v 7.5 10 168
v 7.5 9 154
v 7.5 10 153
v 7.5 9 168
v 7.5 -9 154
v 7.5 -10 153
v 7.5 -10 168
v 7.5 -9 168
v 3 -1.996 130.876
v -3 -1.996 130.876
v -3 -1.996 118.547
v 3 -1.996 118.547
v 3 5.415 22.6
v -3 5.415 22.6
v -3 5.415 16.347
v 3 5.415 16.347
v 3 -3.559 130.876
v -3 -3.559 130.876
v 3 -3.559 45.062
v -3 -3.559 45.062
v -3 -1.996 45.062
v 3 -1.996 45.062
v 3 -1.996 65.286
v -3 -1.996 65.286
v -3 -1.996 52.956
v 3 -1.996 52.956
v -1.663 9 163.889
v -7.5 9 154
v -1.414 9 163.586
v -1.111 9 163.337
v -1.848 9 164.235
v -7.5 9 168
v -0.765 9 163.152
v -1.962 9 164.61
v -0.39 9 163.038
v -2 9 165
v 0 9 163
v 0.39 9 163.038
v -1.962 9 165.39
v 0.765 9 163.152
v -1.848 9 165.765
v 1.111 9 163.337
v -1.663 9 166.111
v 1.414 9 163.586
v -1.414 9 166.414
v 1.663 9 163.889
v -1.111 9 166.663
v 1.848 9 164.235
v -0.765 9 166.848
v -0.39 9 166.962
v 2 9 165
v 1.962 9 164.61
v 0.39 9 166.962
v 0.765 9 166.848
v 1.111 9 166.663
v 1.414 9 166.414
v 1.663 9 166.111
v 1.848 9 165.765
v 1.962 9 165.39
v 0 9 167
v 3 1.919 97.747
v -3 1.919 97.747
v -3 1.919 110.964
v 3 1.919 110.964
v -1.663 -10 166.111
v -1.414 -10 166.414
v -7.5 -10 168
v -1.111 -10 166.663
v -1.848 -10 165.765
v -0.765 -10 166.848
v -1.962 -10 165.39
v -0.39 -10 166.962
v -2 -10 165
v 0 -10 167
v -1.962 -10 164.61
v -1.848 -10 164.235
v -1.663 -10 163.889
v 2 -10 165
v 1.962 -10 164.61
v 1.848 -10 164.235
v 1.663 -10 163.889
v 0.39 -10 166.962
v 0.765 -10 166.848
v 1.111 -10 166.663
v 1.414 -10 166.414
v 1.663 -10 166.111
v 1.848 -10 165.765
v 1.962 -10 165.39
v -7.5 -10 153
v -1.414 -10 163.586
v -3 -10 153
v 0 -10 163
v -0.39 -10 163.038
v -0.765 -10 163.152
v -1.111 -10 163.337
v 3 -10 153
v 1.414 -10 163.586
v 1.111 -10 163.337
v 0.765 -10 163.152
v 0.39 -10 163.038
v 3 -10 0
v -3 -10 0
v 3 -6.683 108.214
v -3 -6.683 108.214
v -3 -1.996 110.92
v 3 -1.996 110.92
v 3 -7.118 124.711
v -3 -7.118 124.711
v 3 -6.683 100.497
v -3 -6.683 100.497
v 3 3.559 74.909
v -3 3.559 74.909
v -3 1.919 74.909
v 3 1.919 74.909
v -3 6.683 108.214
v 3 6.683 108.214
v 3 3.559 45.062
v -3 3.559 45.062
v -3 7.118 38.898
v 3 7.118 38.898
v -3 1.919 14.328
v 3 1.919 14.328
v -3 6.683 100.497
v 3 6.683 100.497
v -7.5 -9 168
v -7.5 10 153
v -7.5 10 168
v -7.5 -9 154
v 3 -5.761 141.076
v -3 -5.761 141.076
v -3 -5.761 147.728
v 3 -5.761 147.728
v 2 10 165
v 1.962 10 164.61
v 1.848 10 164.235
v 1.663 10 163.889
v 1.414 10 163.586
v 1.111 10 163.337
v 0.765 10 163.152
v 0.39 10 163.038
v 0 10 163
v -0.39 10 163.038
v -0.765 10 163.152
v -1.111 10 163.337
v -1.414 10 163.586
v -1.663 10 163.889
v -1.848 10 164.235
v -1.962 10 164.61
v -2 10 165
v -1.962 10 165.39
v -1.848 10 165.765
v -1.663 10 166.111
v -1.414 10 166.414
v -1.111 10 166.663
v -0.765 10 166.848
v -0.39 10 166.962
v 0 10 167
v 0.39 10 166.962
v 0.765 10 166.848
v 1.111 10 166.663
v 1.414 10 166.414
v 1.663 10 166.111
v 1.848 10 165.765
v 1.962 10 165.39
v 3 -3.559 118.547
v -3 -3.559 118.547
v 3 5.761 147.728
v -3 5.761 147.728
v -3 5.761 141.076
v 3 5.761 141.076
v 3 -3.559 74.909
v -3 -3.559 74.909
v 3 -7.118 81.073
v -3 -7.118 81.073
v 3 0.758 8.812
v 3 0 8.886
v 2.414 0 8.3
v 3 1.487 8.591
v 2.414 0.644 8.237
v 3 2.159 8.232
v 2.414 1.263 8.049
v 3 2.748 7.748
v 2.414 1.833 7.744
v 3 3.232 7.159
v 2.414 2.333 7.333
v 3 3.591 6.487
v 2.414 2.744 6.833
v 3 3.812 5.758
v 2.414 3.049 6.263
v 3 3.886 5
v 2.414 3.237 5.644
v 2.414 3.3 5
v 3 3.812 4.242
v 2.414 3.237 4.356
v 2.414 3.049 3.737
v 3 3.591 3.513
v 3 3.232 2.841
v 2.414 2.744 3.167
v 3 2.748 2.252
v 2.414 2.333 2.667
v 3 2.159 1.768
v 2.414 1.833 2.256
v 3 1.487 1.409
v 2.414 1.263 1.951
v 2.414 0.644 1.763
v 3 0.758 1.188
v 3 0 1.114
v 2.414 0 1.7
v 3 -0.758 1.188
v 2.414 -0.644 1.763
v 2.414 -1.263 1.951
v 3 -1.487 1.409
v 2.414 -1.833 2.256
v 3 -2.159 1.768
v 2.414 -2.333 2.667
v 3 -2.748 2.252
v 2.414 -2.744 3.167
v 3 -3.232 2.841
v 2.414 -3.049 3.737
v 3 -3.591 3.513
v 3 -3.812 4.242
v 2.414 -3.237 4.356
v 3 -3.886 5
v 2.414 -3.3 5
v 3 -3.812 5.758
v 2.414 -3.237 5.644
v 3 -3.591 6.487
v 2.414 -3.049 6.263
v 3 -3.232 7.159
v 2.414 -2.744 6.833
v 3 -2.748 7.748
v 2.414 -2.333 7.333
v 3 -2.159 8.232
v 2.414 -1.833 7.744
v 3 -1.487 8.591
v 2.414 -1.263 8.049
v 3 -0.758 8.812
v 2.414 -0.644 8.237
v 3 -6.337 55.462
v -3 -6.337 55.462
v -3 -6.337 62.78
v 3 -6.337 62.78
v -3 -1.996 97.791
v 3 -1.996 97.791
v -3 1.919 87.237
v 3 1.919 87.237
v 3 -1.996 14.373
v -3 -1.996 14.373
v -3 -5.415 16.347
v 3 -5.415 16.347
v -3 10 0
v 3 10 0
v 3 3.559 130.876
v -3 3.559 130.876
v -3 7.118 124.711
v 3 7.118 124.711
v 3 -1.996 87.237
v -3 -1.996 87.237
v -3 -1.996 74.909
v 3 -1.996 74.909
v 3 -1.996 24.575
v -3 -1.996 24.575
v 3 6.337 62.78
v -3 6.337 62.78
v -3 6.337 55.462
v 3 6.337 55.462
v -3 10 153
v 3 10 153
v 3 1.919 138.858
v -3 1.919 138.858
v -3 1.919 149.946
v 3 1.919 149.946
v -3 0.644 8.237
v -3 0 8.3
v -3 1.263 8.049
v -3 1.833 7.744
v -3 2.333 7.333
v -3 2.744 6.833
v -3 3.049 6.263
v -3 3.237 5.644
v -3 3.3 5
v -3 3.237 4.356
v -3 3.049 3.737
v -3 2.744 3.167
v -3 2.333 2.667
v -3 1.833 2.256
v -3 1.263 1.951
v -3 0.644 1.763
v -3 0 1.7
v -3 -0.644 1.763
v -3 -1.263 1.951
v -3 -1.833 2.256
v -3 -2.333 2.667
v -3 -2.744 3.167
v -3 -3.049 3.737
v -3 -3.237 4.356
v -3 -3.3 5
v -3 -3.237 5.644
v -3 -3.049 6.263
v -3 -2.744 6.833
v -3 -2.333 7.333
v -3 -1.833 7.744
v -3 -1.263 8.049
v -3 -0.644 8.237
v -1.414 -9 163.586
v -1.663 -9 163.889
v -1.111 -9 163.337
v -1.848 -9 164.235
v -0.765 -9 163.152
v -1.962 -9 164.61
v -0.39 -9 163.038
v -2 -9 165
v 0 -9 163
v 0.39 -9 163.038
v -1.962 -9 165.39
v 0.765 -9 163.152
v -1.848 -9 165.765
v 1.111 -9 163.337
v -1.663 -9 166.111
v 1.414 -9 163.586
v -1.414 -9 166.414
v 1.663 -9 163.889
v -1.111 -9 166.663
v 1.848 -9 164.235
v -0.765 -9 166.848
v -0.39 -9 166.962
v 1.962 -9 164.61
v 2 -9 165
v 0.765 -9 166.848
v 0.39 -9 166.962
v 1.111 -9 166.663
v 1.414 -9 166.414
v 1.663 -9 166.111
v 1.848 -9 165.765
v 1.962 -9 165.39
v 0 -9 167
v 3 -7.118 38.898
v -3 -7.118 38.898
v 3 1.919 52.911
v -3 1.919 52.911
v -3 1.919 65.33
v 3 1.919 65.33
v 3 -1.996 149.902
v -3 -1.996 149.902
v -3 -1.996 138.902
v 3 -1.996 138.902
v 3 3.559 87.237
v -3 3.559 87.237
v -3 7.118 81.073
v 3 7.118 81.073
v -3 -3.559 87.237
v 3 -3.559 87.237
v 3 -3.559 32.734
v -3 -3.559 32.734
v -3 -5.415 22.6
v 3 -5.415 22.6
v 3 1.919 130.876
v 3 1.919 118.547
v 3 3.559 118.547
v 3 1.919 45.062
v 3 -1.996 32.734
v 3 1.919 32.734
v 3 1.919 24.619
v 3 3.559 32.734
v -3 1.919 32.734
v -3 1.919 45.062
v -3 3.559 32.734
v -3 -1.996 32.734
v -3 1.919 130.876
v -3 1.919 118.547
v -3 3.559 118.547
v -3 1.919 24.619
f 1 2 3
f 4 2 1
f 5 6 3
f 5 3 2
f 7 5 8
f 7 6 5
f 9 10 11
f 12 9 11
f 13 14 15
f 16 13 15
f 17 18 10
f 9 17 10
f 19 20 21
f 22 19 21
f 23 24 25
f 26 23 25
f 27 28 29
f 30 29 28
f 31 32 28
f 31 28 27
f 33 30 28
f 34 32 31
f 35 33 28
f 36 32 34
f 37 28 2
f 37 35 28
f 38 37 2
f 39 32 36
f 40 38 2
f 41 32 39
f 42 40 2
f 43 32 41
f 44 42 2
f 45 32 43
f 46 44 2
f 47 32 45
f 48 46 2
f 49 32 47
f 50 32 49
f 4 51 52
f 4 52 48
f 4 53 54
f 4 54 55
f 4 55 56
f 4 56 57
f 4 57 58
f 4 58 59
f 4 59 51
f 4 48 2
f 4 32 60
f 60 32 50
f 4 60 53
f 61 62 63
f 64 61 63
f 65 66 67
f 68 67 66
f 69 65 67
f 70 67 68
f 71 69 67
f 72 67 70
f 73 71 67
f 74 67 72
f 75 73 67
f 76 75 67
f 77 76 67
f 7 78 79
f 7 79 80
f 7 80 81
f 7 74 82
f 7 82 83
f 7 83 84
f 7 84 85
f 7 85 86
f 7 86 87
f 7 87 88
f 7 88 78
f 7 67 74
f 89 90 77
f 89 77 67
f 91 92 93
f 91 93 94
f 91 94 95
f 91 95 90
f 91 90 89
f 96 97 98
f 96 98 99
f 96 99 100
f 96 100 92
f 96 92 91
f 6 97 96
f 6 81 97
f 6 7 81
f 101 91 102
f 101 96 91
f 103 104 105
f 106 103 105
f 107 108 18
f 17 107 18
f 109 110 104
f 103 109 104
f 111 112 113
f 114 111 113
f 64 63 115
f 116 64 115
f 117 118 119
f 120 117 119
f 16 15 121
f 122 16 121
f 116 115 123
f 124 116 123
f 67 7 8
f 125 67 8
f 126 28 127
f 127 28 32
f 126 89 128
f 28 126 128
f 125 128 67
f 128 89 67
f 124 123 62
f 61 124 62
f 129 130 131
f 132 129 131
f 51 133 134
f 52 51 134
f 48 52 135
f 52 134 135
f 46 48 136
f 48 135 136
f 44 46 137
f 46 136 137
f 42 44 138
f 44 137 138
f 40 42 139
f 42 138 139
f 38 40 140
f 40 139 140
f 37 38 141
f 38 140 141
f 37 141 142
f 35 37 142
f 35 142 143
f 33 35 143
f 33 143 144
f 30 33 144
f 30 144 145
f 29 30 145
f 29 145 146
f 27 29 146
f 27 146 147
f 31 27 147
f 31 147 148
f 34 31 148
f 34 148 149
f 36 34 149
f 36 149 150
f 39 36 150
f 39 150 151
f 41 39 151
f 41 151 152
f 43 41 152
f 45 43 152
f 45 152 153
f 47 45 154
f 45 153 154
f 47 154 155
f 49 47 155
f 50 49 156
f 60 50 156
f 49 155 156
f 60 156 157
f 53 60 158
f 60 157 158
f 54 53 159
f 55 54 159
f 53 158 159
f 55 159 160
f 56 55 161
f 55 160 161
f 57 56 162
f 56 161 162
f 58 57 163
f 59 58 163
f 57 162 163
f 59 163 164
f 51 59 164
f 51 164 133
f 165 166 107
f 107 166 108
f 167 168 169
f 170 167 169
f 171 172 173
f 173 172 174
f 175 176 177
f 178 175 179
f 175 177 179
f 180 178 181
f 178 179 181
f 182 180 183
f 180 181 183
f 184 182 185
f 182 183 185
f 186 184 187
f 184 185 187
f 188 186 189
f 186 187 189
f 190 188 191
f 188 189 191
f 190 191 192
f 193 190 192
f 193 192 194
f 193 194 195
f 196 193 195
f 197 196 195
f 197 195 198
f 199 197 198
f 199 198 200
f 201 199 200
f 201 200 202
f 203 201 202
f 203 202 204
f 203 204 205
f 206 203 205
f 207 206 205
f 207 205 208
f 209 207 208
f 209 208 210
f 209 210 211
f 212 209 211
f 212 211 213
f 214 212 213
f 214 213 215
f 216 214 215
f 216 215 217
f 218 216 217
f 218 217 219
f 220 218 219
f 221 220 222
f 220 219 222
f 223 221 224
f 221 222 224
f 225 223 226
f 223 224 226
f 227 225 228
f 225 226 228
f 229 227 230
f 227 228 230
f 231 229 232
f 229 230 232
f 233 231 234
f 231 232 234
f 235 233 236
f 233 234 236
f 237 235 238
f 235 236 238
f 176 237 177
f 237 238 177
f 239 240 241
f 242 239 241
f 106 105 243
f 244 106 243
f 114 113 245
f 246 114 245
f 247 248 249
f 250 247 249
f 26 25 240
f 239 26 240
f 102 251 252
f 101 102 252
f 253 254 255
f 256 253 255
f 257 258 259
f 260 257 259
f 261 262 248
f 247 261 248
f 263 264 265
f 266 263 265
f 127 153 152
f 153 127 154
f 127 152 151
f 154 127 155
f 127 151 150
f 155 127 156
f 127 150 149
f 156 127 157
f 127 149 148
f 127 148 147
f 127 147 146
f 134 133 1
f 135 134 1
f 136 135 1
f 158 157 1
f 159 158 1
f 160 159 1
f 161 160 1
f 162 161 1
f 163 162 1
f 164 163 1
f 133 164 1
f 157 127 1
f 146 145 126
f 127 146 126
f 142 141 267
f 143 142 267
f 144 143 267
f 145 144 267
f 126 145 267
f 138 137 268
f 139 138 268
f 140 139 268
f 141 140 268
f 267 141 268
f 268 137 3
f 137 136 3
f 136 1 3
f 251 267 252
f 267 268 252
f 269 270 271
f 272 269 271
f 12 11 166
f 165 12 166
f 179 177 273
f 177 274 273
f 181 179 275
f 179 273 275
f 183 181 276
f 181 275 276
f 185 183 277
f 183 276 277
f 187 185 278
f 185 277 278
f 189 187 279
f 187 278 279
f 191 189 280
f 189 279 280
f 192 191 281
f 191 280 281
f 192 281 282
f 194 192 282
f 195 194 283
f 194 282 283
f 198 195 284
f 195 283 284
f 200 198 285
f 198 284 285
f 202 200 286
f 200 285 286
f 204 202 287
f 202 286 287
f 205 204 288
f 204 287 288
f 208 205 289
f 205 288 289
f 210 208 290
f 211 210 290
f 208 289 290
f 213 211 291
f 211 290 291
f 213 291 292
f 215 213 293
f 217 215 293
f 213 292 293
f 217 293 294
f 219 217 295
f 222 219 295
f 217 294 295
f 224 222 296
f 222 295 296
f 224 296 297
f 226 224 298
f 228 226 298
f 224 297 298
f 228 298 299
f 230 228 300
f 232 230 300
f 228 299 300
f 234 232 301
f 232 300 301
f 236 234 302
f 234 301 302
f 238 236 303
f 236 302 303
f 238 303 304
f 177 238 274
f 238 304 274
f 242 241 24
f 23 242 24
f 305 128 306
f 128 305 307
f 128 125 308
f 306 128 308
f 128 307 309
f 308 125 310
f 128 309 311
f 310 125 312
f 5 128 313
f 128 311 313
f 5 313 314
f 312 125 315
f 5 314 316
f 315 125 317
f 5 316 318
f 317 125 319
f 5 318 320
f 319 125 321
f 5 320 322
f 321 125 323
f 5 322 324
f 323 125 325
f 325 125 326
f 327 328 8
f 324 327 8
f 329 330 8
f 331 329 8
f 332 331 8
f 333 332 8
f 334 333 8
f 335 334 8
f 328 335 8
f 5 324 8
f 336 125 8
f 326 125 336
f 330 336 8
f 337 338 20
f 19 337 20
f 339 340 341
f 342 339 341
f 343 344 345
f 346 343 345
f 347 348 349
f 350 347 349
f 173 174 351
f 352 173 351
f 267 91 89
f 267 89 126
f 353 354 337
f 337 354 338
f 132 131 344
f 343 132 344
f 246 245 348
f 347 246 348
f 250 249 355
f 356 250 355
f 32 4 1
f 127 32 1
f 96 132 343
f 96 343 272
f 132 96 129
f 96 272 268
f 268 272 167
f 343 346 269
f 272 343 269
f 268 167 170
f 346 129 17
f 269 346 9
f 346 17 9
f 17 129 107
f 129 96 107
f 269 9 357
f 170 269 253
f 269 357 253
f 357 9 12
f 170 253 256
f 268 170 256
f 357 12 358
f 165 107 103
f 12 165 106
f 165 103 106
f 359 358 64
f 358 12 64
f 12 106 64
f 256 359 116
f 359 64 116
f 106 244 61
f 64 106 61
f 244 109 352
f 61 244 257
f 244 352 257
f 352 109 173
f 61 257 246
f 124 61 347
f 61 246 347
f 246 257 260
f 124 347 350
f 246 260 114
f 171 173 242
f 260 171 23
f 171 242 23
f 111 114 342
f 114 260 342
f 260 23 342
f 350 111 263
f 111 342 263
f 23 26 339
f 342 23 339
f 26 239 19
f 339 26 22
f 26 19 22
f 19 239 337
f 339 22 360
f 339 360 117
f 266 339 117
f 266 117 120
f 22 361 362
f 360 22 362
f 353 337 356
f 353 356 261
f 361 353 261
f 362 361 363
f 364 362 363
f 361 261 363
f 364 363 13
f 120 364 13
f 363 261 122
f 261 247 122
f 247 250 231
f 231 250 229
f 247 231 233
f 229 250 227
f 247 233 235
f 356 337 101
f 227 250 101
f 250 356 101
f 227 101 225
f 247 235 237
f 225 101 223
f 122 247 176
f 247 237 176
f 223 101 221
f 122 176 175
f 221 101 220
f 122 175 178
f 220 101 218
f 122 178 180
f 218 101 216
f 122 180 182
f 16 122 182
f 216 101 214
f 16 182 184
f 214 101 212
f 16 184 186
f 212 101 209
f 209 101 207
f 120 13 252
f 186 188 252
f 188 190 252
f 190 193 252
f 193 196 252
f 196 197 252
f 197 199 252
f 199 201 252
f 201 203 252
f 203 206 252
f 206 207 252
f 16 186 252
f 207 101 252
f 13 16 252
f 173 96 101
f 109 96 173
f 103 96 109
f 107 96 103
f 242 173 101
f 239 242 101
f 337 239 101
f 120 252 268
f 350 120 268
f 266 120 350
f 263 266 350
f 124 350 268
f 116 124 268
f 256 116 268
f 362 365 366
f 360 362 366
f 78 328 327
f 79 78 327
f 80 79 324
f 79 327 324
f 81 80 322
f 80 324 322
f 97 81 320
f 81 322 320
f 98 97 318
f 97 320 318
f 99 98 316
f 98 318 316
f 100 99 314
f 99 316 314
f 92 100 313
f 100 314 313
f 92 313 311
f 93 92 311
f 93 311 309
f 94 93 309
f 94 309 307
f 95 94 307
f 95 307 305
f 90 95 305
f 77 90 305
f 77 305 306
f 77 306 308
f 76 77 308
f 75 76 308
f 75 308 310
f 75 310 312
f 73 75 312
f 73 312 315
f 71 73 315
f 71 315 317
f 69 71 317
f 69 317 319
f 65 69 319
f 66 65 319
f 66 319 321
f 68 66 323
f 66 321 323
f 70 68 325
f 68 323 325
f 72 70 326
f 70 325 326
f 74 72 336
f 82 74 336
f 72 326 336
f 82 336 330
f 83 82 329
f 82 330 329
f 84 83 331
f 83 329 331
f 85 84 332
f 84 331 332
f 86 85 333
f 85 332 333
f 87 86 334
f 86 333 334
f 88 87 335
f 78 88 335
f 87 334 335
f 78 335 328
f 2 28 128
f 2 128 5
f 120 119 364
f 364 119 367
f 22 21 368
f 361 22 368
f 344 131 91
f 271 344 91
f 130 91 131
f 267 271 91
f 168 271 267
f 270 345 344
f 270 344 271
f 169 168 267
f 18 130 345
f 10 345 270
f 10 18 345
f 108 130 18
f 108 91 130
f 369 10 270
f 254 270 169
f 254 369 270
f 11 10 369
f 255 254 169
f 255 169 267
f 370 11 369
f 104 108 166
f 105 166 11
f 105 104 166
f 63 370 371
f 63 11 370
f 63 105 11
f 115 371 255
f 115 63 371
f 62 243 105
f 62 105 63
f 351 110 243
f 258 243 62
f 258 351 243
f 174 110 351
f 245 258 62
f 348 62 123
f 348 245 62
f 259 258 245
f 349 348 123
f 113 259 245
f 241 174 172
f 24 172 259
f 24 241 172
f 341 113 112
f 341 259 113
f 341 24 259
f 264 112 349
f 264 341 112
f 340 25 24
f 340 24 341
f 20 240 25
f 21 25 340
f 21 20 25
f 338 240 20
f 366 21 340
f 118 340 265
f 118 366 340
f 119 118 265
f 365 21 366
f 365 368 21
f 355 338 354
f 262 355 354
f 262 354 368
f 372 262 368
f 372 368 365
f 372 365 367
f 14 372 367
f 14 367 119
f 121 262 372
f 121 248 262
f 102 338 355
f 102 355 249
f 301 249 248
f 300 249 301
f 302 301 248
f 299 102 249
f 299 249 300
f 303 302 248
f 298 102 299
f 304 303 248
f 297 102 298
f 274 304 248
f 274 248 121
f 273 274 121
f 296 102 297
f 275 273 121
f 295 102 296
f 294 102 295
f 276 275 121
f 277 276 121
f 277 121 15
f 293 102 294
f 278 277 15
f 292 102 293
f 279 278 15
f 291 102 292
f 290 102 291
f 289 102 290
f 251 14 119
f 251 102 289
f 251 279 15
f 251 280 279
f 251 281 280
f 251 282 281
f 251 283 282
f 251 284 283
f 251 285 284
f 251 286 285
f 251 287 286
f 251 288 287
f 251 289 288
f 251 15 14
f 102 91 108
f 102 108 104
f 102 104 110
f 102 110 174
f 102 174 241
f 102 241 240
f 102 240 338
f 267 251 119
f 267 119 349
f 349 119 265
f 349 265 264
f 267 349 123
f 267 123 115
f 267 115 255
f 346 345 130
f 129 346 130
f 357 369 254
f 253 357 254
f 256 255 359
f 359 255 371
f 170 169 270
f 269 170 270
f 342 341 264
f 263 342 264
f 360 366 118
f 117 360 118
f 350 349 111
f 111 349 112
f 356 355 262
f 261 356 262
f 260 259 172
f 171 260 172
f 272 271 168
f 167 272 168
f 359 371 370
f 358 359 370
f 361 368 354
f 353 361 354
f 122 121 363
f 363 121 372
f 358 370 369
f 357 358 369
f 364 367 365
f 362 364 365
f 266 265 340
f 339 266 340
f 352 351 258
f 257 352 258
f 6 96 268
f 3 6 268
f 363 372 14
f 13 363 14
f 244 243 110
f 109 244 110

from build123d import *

# Parameters (mm, degrees)
SKETCH_1_W                      = 6
SKETCH_1_H                      = 20
EXTRUDE_1_DEPTH                 = 165
HOLE_WIZARD_G1_16_1_D           = 6.6
HOLE_WIZARD_G1_16_1_DEPTH       = 50
HOLE_WIZARD_G1_16_1_CSINK_D     = 7.773
HOLE_WIZARD_G1_16_1_CSINK_ANGLE = 90
HOLE_WIZARD_G1_16_1_TIP         = 1.982840043
SKETCH_5_W                      = 15
SKETCH_5_H                      = 20
EXTRUDE_2_DEPTH                 = 10
EXTRUDE_2_DEPTH_BACK            = 15
SKETCH_6_W                      = 5.5
SKETCH_6_H                      = 15
SKETCH_6_W_2                    = 4.5
CUT_EXTRUDE_1_DEPTH             = 32
SKETCH_7_W                      = 15
SKETCH_7_H                      = 18
CUT_EXTRUDE_2_DEPTH             = 14
SKETCH_8_R                      = 2
CUT_EXTRUDE_3_DEPTH             = 39
CUT_EXTRUDE_4_DEPTH             = 70


with BuildPart() as part:
    # 草图1 → 凸台-拉伸1 (new body)
    with BuildSketch(Plane.XY):
        Rectangle(SKETCH_1_W, SKETCH_1_H)
    extrude(amount=EXTRUDE_1_DEPTH)

    # G1/16 螺纹孔1
    with Locations(Plane(origin=(3, 0, 0), x_dir=(0, 0, -1), z_dir=(1, 0, 0))):
        with Locations((-5, 0)):
            CounterSinkHole(HOLE_WIZARD_G1_16_1_D / 2, HOLE_WIZARD_G1_16_1_CSINK_D / 2, depth=HOLE_WIZARD_G1_16_1_DEPTH, counter_sink_angle=HOLE_WIZARD_G1_16_1_CSINK_ANGLE)
            with Locations((0, 0, -(HOLE_WIZARD_G1_16_1_DEPTH + HOLE_WIZARD_G1_16_1_TIP / 2))):  # 118° drill point
                Cone(0, HOLE_WIZARD_G1_16_1_D / 2, HOLE_WIZARD_G1_16_1_TIP, mode=Mode.SUBTRACT)

    # 草图5 → 凸台-拉伸2 (add, two sides)
    with BuildSketch(Plane(origin=(3, 0, 0), x_dir=(0, 0, -1), z_dir=(1, 0, 0))) as extrude_2_sk:
        with Locations((-160.5, 0)):
            Rectangle(SKETCH_5_W, SKETCH_5_H)
    extrude(amount=EXTRUDE_2_DEPTH)
    extrude(extrude_2_sk.sketch, amount=-EXTRUDE_2_DEPTH_BACK)

    # 草图6 → 切除-拉伸1 (cut)
    with BuildSketch(Plane.XZ.offset(10)):
        with Locations((10.25, 160.5)):
            Rectangle(SKETCH_6_W, SKETCH_6_H)
        with Locations((-9.75, 160.5)):
            Rectangle(SKETCH_6_W_2, SKETCH_6_H)
    extrude(amount=-CUT_EXTRUDE_1_DEPTH, mode=Mode.SUBTRACT)

    # 草图7 → 切除-拉伸2 (cut)
    with BuildSketch(Plane.XY.offset(168)):
        Rectangle(SKETCH_7_W, SKETCH_7_H)
    extrude(amount=-CUT_EXTRUDE_2_DEPTH, mode=Mode.SUBTRACT)

    # 草图8 → 切除-拉伸3 (cut)
    with BuildSketch(Plane(origin=(0, 10, 0), x_dir=(1, 0, 0), z_dir=(0, 1, 0))):
        with Locations((0, -165)):
            Circle(SKETCH_8_R)
    extrude(amount=-CUT_EXTRUDE_3_DEPTH, mode=Mode.SUBTRACT)

    # 草图9 → 切除-拉伸4 (cut)
    with BuildSketch(Plane.ZY.offset(3)):
        Polygon((14.328441006, 1.918732887), (24.619003084, 1.918732887), (22.600253038, 5.415310533), (16.347191051, 5.415310533), align=None)
        Polygon((22.600253038, -5.415310533), (24.57465807, -1.995540703), (14.372786019, -1.995540703), (16.347191051, -5.415310533), align=None)
        Polygon((32.73389091, 1.918732887), (45.062363825, 1.918732887), (45.062363825, 3.558923578), (38.898127367, 7.117847156), (32.73389091, 3.558923578), align=None)
        Polygon((45.062363825, -3.558923578), (45.062363825, -1.995540703), (32.73389091, -1.995540703), (32.73389091, -3.558923578), (38.898127367, -7.117847156), align=None)
        Polygon((52.911163907, 1.918732887), (65.330427938, 1.918732887), (62.779502404, 6.337065517), (55.46208944, 6.337065517), align=None)
        Polygon((62.779502404, -6.337065517), (65.286082924, -1.995540703), (52.95550892, -1.995540703), (55.46208944, -6.337065517), align=None)
        Polygon((87.237271272, -3.558923578), (87.237271272, -1.995540703), (74.908798357, -1.995540703), (74.908798357, -3.558923578), (81.073034814, -7.117847156), align=None)
        Polygon((74.908798357, 1.918732887), (87.237271272, 1.918732887), (87.237271272, 3.558923578), (81.073034814, 7.117847156), (74.908798357, 3.558923578), align=None)
        Polygon((97.746948796, 1.918732887), (110.964476059, 1.918732887), (108.213984717, 6.682723636), (100.497440137, 6.682723636), align=None)
        Polygon((108.213984717, -6.682723636), (110.920131045, -1.995540703), (97.791293809, -1.995540703), (100.497440137, -6.682723636), align=None)
        Polygon((118.547188397, 1.918732887), (130.875661312, 1.918732887), (130.875661312, 3.558923578), (124.711424854, 7.117847156), (118.547188397, 3.558923578), align=None)
        Polygon((130.875661312, -3.558923578), (130.875661312, -1.995540703), (118.547188397, -1.995540703), (118.547188397, -3.558923578), (124.711424854, -7.117847156), align=None)
        Polygon((138.857505266, 1.918732887), (149.946330576, 1.918732887), (147.728014723, 5.760968652), (141.075821119, 5.760968652), align=None)
        Polygon((147.728014723, -5.760968652), (149.901985563, -1.995540703), (138.901850279, -1.995540703), (141.075821119, -5.760968652), align=None)
    extrude(amount=-CUT_EXTRUDE_4_DEPTH, mode=Mode.SUBTRACT)


solid = part.part
